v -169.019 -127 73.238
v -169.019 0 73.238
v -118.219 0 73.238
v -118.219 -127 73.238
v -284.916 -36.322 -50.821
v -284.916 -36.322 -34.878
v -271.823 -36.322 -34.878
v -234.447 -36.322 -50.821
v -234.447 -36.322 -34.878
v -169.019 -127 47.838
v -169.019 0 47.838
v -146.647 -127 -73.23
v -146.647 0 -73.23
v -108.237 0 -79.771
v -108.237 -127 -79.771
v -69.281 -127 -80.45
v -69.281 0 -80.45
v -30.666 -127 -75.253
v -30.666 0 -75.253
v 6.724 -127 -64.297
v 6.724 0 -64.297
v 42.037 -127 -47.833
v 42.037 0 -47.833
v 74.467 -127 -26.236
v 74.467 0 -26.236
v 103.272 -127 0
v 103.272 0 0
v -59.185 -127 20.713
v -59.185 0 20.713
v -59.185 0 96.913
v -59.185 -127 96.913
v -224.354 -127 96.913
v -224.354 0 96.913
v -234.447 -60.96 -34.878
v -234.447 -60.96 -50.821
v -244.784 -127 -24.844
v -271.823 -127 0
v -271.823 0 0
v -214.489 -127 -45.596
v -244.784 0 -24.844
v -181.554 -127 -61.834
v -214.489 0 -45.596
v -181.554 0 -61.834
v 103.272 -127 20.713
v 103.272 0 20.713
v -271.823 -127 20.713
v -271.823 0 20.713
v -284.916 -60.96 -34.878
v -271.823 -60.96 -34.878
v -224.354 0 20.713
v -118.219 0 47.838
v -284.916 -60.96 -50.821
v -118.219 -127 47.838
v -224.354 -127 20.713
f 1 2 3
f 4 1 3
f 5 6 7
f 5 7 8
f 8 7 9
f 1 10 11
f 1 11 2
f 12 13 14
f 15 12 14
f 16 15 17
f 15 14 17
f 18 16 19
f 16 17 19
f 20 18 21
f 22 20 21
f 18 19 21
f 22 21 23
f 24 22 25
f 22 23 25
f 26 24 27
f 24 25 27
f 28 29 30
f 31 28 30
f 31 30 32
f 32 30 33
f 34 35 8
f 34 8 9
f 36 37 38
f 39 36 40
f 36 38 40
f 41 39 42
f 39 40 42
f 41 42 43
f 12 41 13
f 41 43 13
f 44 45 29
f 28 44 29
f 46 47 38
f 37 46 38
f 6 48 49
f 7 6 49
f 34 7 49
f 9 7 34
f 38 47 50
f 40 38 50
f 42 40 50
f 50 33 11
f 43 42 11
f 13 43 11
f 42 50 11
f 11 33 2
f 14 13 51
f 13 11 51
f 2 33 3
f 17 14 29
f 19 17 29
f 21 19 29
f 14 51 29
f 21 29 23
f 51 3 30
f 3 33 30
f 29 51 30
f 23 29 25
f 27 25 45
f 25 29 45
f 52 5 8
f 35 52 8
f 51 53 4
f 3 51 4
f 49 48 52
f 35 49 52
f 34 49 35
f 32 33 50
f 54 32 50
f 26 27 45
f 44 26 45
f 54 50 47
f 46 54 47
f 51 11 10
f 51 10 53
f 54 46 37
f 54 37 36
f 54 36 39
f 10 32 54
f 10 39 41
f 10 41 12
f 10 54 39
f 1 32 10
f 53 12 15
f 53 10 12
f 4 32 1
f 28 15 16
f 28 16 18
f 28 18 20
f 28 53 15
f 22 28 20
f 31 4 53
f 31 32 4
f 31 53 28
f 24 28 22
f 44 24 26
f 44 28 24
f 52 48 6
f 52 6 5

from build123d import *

# Parameters (mm, degrees)
F1_DEPTH = 127
F0_W     = 50.8
F0_H     = 25.4
F2_START = 36.322
F0_W_2   = 37.3759667383
F0_H_2   = 15.9422476888
F2_DEPTH = 24.638


# Not quite as in the source:
# - a feature names something its author has since deleted; it is built from what else it names


with BuildPart() as f1:
    # F0 (on Front) → F1 (new body)
    with BuildSketch(Plane.XZ):
        Polygon((-307.3281569301, -41.3140561762), (-306.4012624873, -41.288353515), (-306.7446031917, -40.692556251), align=None)
    extrude(amount=F1_DEPTH)


with BuildPart() as f1b:
    # F0 (on Front) → F1, piece 2 (new body)
    with BuildSketch(Plane.XZ):
        with BuildLine():
            Line((-21.9041593159, -73.2302481236), (-146.6470350679, -73.2302481236))
            ThreePointArc((-146.6470350679, -73.2302481236), (-84.2755971919, -80.8868076681), (-21.9041593159, -73.2302481236))
        make_face()
        Polygon((-224.3537551874, 96.9131923319), (-224.3537551874, 20.7131923319), (-197.7432811606, 20.7131923319), (-83.9606040237, 20.7131923319), (-59.1853400261, 20.7131923319), (-59.1853400261, 96.9131923319), (-160.1215863499, 96.9131923319), (-161.9567914552, 96.9131923319), align=None)
        with Locations((-143.6194745734, 60.5380154436)):
            Rectangle(F0_W, F0_H, mode=Mode.SUBTRACT)
        with BuildLine():
            Line((-224.3537551874, 20.7131923319), (-271.8233303091, 20.7131923319))
            Line((-271.8233303091, 20.7131923319), (-271.8233303091, 0))
            ThreePointArc((-271.8233303091, 0), (-214.4891345739, -45.5959789578), (-146.6470350679, -73.2302481236))
            Line((-146.6470350679, -73.2302481236), (-21.9041593159, -73.2302481236))
            ThreePointArc((-21.9041593159, -73.2302481236), (45.9379401902, -45.5959789578), (103.2721359253, 0))
            Line((103.2721359253, 0), (103.2721359253, 20.7131923319))
            Line((103.2721359253, 20.7131923319), (-59.1853400261, 20.7131923319))
            Line((-59.1853400261, 20.7131923319), (-83.9606040237, 20.7131923319))
            Line((-83.9606040237, 20.7131923319), (-197.7432811606, 20.7131923319))
            Line((-197.7432811606, 20.7131923319), (-224.3537551874, 20.7131923319))
        make_face()
    extrude(amount=F1_DEPTH)


with BuildPart() as f2:
    # F0 (on Front) → F2 (new body)
    with BuildSketch(Plane.XZ.offset(F2_START)):
        with Locations((-253.13534694, -42.8495634074)):
            Rectangle(F0_W_2, F0_H_2)
        Polygon((-271.8233303091, -50.8206872518), (-271.8233303091, -34.8784395629), (-284.9155039664, -34.8784395629), (-284.9155039664, -40.692556251), (-284.9155039664, -50.8206872518), align=None)
    extrude(amount=F2_DEPTH)


solid = Compound([f1b.part, f2.part])
